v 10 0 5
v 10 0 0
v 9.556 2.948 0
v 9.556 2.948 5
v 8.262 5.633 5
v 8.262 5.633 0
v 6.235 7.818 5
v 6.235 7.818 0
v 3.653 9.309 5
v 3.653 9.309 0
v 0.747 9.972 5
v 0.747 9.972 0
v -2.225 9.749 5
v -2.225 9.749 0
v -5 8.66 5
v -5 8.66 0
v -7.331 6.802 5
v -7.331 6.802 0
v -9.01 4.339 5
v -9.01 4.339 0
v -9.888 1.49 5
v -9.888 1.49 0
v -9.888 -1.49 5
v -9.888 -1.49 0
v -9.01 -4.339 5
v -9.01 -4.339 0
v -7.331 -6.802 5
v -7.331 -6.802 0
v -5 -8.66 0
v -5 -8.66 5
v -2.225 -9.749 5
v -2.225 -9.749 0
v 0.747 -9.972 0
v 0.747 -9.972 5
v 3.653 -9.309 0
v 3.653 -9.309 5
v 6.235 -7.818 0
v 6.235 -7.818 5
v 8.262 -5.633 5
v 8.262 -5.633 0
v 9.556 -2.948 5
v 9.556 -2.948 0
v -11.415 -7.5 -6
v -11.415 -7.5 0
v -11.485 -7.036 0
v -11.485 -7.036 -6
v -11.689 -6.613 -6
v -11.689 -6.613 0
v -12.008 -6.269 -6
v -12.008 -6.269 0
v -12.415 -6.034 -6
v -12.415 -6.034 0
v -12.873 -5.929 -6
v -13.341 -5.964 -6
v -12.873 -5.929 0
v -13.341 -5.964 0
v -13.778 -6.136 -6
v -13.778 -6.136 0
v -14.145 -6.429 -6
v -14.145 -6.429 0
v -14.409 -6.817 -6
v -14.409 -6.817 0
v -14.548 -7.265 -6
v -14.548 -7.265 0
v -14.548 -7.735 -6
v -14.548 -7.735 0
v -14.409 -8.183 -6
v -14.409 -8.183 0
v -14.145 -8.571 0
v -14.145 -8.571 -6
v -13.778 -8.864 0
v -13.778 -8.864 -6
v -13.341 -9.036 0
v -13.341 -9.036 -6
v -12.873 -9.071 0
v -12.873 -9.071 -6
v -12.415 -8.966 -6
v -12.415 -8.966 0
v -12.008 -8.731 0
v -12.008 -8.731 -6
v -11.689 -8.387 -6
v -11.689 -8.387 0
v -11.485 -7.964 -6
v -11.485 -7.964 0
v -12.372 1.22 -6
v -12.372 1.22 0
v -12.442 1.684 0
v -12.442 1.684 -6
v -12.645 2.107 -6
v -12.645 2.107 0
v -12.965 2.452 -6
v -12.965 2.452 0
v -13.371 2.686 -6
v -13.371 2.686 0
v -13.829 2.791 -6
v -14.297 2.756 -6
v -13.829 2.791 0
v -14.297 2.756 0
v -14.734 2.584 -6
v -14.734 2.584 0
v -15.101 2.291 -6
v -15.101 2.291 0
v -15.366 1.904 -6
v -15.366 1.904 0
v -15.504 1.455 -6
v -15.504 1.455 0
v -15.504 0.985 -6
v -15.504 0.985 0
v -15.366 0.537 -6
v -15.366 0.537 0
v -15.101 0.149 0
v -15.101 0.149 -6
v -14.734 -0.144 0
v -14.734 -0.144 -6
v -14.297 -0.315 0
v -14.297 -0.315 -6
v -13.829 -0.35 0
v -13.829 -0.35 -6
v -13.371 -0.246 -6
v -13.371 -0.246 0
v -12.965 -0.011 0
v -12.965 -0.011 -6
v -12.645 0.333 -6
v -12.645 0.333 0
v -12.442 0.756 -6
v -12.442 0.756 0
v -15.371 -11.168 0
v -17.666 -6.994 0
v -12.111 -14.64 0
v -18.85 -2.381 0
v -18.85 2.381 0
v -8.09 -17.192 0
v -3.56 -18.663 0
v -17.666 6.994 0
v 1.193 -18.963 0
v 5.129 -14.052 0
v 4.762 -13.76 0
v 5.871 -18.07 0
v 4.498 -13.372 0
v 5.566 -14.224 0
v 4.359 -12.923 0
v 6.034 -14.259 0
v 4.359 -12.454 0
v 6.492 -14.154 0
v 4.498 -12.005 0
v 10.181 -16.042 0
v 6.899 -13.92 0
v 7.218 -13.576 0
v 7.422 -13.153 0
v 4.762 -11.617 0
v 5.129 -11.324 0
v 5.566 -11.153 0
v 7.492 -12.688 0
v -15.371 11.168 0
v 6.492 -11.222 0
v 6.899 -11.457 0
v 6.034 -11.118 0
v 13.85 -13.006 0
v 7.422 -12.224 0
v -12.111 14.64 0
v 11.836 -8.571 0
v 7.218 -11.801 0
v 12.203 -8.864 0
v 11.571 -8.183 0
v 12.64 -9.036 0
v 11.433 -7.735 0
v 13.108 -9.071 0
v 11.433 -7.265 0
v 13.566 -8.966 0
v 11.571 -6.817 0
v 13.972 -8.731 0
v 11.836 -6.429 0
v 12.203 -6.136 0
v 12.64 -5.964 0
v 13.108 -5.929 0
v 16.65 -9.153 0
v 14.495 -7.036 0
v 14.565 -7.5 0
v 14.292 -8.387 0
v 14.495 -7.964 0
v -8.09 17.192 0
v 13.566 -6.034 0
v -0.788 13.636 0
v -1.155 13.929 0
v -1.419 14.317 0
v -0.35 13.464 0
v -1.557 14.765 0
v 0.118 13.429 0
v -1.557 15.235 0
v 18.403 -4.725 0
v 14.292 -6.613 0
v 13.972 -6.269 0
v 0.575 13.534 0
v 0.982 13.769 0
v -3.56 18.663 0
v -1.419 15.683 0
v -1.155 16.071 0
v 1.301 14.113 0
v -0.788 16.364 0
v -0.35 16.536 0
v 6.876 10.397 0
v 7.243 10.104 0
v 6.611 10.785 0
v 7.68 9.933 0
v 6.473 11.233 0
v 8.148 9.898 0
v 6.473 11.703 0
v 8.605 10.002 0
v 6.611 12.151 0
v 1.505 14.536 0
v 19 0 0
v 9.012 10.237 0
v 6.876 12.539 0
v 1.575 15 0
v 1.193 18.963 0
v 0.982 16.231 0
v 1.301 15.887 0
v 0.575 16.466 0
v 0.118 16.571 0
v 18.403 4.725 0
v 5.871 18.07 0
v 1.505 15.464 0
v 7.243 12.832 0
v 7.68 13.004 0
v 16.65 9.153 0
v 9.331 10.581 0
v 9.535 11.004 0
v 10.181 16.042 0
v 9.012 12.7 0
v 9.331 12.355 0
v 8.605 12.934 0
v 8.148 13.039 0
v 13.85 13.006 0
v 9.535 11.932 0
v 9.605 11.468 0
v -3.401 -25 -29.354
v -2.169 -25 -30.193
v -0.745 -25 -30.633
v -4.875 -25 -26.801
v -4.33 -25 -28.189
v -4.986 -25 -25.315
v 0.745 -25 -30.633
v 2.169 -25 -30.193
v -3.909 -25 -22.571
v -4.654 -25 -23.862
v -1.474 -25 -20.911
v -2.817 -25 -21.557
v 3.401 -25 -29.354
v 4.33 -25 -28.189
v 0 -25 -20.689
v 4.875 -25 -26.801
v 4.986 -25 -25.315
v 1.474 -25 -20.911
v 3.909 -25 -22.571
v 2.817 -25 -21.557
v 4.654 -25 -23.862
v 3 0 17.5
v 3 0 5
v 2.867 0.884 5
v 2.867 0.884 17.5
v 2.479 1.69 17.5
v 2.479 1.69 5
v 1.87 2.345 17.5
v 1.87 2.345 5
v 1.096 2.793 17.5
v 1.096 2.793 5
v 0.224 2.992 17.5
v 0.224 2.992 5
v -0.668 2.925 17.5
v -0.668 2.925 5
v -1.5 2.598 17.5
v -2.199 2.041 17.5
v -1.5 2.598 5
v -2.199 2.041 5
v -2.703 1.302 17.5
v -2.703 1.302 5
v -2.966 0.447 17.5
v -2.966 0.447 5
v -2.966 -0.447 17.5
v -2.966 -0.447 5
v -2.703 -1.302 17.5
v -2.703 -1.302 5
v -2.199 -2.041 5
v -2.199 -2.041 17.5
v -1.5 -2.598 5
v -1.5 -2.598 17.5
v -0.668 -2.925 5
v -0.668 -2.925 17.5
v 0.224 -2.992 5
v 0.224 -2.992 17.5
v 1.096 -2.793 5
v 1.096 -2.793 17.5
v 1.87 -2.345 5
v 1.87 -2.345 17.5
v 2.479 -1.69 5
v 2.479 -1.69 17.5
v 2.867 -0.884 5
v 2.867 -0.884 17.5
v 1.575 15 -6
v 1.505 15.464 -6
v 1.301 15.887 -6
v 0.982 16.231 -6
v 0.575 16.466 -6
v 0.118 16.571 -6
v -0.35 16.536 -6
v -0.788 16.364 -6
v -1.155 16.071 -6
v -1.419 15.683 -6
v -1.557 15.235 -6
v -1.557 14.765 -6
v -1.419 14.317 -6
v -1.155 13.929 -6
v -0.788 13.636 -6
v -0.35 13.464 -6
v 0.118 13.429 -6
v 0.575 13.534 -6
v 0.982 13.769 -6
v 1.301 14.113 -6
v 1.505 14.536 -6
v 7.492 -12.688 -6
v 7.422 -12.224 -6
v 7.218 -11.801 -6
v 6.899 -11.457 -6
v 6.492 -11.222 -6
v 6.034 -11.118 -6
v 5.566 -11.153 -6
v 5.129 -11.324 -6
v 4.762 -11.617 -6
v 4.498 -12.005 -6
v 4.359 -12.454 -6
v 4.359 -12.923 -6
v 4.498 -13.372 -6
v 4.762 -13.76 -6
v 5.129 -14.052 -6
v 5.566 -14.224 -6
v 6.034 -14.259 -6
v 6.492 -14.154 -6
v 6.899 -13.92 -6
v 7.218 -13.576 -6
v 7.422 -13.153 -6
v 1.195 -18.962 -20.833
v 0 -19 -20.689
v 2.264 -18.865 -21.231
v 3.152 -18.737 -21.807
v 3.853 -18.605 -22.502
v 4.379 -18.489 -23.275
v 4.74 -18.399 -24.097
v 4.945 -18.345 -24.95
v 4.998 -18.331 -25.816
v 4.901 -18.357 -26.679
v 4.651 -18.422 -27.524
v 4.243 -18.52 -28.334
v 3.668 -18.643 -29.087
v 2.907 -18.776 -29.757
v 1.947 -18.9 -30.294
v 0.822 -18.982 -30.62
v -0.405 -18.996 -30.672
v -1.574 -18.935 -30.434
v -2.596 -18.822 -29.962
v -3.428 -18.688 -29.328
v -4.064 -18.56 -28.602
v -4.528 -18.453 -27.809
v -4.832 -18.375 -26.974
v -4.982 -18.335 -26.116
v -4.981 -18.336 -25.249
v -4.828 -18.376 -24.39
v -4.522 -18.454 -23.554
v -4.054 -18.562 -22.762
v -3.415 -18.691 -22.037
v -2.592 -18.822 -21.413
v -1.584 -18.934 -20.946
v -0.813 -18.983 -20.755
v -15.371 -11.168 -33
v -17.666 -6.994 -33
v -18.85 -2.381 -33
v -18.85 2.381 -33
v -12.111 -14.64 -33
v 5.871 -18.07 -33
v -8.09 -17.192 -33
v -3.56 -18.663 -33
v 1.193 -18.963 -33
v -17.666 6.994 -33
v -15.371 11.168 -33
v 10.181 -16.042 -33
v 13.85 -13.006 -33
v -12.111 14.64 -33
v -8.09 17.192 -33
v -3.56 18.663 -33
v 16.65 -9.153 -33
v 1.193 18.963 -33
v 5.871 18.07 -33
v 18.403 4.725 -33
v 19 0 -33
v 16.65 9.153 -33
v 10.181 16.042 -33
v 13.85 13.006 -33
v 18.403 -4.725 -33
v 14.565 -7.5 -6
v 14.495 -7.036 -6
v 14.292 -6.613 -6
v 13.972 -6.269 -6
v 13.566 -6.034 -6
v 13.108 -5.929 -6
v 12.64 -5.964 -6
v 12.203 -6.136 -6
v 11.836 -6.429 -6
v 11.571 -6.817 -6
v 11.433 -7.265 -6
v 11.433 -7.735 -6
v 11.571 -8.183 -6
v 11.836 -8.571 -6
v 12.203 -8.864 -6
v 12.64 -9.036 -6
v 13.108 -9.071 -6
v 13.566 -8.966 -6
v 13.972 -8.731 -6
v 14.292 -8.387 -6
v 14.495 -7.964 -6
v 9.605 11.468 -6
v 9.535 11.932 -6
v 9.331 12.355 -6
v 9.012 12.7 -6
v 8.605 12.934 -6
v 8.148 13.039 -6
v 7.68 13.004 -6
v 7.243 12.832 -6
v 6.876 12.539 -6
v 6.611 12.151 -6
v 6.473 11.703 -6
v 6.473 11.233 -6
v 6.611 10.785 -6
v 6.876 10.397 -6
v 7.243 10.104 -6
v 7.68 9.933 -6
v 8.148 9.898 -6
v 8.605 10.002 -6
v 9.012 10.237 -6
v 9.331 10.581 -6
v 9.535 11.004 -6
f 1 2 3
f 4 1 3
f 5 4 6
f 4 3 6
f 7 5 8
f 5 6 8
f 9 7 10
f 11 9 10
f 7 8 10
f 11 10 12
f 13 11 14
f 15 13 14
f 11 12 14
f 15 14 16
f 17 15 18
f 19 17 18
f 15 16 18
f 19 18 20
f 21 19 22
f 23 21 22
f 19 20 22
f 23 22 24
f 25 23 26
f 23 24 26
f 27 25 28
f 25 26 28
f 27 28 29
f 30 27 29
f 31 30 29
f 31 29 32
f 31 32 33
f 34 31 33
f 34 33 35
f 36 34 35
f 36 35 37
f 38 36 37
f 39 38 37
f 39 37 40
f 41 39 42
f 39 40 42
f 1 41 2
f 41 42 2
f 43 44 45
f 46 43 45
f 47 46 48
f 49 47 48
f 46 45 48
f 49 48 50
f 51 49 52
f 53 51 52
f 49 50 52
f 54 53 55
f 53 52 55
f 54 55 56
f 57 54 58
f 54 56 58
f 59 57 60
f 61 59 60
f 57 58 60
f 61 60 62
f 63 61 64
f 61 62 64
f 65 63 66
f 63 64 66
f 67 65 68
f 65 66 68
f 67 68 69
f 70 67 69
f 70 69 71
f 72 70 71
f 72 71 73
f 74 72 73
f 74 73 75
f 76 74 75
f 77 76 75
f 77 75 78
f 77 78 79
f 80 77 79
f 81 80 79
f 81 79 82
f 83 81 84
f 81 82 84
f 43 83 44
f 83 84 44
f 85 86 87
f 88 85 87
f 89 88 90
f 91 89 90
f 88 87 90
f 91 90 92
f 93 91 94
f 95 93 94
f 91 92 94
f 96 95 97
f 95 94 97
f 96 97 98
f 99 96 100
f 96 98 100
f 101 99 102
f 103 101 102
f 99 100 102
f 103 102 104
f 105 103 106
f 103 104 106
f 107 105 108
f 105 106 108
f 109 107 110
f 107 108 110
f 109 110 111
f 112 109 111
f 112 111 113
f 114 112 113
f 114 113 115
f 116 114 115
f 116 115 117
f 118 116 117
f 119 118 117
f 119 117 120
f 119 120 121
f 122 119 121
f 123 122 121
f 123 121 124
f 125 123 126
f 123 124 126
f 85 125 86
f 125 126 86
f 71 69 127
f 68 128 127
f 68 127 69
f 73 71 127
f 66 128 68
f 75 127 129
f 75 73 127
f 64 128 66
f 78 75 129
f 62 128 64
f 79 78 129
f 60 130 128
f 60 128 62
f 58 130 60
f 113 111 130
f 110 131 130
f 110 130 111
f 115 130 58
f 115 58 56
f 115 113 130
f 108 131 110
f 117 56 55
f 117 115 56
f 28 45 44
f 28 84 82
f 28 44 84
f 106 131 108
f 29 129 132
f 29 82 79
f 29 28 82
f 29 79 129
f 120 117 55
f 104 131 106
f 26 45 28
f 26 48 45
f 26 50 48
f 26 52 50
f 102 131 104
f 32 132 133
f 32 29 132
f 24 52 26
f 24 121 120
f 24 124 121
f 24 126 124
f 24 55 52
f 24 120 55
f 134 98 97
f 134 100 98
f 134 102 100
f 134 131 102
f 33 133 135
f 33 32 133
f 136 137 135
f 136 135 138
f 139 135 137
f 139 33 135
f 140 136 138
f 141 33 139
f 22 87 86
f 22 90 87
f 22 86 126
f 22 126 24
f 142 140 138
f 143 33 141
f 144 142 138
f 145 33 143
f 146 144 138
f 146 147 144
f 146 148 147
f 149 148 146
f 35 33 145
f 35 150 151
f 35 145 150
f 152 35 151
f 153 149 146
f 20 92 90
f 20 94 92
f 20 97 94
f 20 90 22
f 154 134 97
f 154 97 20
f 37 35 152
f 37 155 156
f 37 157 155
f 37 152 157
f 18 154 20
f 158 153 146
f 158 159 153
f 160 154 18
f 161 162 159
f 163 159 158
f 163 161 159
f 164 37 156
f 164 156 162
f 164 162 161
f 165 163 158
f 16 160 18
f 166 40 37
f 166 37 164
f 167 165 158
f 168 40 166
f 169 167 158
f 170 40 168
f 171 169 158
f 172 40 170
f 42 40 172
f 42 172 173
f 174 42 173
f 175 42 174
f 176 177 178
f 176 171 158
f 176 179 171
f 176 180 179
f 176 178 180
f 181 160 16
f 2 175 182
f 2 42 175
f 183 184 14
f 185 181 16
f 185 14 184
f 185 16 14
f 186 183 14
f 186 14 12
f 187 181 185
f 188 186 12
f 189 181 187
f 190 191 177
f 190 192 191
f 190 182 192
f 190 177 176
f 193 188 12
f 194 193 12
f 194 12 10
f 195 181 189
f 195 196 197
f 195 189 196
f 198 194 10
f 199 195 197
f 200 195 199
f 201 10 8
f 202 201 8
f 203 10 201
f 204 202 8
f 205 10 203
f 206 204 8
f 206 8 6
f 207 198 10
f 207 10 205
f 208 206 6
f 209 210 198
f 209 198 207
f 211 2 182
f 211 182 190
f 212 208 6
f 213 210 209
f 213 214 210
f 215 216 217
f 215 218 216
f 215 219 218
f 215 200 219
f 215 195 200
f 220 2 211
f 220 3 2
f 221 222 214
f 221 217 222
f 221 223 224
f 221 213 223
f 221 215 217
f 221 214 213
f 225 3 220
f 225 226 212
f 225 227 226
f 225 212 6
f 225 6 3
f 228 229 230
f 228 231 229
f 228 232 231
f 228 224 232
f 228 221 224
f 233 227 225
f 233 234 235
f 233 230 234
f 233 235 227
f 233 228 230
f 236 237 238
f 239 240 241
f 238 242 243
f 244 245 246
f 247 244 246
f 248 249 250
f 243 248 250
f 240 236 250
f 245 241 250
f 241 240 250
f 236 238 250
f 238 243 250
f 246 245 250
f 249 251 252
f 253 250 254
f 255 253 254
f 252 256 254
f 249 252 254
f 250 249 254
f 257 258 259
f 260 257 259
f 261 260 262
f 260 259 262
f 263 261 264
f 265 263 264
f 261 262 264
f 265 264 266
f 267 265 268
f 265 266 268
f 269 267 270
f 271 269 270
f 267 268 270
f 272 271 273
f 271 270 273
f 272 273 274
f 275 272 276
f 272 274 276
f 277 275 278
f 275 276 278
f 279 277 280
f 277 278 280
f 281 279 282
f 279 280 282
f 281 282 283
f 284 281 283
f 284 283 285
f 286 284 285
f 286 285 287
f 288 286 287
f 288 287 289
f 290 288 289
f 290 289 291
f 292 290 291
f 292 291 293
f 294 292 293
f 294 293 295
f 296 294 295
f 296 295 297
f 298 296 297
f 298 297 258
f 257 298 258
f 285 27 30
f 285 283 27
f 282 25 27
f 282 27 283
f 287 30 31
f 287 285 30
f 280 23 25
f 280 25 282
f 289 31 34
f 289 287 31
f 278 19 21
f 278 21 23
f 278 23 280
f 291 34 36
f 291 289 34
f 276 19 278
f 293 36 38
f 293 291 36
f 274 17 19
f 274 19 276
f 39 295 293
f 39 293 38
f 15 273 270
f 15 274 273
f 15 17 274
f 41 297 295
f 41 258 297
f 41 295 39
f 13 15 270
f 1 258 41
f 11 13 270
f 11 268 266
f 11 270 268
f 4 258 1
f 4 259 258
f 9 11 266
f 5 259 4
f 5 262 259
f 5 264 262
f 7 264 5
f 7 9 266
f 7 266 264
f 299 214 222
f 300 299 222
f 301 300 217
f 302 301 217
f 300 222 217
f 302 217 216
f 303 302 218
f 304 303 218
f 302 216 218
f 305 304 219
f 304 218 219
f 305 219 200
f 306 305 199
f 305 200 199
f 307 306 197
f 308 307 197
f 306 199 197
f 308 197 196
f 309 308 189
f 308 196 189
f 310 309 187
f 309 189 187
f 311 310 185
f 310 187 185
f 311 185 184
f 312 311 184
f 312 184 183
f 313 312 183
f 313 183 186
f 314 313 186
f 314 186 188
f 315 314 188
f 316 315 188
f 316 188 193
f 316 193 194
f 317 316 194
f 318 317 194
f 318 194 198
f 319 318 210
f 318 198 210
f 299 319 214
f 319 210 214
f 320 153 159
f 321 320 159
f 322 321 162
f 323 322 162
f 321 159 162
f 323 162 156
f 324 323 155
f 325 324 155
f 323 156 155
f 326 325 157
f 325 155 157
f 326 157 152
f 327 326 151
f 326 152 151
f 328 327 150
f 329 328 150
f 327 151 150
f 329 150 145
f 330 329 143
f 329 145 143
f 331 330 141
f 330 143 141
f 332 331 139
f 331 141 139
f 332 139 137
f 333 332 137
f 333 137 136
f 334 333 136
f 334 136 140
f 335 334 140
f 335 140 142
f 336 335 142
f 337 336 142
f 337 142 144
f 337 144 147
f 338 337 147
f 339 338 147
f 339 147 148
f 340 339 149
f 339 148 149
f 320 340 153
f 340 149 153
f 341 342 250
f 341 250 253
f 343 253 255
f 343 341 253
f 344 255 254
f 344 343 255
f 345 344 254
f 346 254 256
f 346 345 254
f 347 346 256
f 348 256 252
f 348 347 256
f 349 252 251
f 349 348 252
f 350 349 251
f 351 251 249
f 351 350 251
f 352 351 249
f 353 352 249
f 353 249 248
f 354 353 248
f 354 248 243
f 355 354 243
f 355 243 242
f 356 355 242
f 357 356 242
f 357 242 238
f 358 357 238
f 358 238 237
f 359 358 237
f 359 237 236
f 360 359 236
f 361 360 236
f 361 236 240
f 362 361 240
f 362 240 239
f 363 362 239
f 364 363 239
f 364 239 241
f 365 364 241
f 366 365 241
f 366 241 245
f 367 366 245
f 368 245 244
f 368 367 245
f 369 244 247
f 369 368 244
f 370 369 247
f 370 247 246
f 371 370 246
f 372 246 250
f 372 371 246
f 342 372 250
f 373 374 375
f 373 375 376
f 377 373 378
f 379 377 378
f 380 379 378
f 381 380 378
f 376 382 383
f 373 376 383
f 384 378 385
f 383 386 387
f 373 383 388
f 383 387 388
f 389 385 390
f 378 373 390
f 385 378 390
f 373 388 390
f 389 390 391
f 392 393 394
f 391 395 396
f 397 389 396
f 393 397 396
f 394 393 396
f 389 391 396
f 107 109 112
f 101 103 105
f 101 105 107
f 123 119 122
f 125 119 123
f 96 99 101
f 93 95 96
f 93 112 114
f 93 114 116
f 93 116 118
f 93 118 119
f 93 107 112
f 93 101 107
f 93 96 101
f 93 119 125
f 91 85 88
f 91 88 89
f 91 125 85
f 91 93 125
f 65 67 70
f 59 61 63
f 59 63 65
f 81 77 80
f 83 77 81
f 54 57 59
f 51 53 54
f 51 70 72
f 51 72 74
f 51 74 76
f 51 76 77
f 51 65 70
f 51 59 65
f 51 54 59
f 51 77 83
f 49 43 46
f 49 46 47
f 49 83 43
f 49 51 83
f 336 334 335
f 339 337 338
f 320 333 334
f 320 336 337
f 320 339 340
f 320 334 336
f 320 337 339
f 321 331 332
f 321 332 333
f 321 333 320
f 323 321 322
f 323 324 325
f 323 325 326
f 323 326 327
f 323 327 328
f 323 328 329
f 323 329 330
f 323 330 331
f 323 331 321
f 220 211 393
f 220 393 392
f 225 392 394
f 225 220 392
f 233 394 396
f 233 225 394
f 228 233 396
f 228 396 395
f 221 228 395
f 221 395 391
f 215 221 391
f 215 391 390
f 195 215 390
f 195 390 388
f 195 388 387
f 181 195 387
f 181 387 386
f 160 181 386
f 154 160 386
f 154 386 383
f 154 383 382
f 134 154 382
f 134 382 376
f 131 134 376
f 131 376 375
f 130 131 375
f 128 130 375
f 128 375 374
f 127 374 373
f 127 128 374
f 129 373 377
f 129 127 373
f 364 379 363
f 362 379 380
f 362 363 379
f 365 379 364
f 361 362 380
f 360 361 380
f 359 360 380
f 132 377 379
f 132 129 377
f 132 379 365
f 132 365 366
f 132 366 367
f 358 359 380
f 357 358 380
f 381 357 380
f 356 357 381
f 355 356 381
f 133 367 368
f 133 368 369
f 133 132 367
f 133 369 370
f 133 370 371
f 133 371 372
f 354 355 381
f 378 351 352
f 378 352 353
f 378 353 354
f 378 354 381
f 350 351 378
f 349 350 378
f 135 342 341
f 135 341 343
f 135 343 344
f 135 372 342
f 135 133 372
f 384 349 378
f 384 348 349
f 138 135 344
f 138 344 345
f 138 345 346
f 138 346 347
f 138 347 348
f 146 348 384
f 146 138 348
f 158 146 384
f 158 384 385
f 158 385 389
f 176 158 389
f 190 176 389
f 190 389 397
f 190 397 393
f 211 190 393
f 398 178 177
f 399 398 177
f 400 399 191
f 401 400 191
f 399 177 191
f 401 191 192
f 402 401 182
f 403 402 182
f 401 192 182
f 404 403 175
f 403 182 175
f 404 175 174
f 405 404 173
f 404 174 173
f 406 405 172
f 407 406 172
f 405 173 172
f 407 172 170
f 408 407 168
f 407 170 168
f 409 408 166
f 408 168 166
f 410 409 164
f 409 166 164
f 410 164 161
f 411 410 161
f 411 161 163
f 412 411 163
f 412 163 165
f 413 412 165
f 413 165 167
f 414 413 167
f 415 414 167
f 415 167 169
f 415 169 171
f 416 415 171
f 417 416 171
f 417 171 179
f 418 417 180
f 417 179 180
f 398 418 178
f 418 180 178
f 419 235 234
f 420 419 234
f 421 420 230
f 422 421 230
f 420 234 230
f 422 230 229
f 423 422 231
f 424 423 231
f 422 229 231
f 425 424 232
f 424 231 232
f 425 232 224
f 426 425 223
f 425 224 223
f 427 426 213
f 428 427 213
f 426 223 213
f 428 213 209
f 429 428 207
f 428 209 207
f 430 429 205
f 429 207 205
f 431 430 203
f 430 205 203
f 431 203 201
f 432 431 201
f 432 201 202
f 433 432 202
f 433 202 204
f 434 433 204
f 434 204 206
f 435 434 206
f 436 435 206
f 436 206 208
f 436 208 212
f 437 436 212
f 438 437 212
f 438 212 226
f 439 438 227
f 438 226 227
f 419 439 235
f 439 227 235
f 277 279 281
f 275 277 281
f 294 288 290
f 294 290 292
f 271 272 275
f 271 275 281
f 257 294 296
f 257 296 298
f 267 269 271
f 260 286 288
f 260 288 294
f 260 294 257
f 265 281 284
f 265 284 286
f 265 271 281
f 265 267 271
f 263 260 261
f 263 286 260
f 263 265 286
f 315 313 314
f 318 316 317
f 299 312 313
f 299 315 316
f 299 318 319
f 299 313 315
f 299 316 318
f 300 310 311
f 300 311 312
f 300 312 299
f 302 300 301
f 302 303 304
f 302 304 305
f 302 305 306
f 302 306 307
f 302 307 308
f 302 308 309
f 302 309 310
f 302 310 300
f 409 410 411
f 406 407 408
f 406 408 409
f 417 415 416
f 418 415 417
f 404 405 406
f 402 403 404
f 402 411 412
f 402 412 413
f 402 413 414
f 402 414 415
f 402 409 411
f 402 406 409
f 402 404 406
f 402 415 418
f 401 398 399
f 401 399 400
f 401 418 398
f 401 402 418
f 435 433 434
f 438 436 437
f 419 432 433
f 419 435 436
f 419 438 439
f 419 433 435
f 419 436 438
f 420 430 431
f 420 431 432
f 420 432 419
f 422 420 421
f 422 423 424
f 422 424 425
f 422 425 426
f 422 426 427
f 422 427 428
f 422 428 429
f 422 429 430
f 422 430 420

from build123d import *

# Parameters (mm, degrees)
SKETCH2_R           = 19
BOSS_EXTRUDE1_DEPTH = 33
SKETCH2_3_R         = 10
SKETCH2_3_R_2       = 3
BOSS_EXTRUDE2_DEPTH = 5
SKETCH2_4_R         = 3
BOSS_EXTRUDE3_DEPTH = 17.5
SKETCH4_R           = 5
BOSS_EXTRUDE4_DEPTH = 25
SKETCH5_R           = 1.575
CUT_EXTRUDE1_DEPTH  = 6


with BuildPart() as part:
    # Sketch2 → Boss-Extrude1 (new body)
    with BuildSketch(Plane.XY):
        Circle(SKETCH2_R)
    extrude(amount=-BOSS_EXTRUDE1_DEPTH)

    # Sketch2<3> → Boss-Extrude2 (add)
    with BuildSketch(Plane.XY):
        Circle(SKETCH2_3_R)
        Circle(SKETCH2_3_R_2, mode=Mode.SUBTRACT)
    extrude(amount=BOSS_EXTRUDE2_DEPTH)

    # Sketch2<4> → Boss-Extrude3 (add)
    with BuildSketch(Plane.XY):
        Circle(SKETCH2_4_R)
    extrude(amount=BOSS_EXTRUDE3_DEPTH)

    # Sketch4 → Boss-Extrude4 (add)
    with BuildSketch(Plane(origin=(0, 0, 0), x_dir=(1, 0, 0), z_dir=(0, 1, 0))):
        with Locations((0, 25.688557627)):
            Circle(SKETCH4_R)
    extrude(amount=-BOSS_EXTRUDE4_DEPTH)

    # Sketch5 → Cut-Extrude1 (cut)
    with BuildSketch(Plane.XY):
        with Locations((0, 15)):
            Circle(SKETCH5_R)
        with Locations((12.990381057, -7.5)):
            Circle(SKETCH5_R)
        with Locations((-12.990381057, -7.5)):
            Circle(SKETCH5_R)
        with Locations((8.030070109, 11.46812862)):
            Circle(SKETCH5_R)
        with Locations((5.916655664, -12.688309019)):
            Circle(SKETCH5_R)
        with Locations((-13.946725773, 1.220180398)):
            Circle(SKETCH5_R)
    extrude(amount=-CUT_EXTRUDE1_DEPTH, mode=Mode.SUBTRACT)


solid = part.part
